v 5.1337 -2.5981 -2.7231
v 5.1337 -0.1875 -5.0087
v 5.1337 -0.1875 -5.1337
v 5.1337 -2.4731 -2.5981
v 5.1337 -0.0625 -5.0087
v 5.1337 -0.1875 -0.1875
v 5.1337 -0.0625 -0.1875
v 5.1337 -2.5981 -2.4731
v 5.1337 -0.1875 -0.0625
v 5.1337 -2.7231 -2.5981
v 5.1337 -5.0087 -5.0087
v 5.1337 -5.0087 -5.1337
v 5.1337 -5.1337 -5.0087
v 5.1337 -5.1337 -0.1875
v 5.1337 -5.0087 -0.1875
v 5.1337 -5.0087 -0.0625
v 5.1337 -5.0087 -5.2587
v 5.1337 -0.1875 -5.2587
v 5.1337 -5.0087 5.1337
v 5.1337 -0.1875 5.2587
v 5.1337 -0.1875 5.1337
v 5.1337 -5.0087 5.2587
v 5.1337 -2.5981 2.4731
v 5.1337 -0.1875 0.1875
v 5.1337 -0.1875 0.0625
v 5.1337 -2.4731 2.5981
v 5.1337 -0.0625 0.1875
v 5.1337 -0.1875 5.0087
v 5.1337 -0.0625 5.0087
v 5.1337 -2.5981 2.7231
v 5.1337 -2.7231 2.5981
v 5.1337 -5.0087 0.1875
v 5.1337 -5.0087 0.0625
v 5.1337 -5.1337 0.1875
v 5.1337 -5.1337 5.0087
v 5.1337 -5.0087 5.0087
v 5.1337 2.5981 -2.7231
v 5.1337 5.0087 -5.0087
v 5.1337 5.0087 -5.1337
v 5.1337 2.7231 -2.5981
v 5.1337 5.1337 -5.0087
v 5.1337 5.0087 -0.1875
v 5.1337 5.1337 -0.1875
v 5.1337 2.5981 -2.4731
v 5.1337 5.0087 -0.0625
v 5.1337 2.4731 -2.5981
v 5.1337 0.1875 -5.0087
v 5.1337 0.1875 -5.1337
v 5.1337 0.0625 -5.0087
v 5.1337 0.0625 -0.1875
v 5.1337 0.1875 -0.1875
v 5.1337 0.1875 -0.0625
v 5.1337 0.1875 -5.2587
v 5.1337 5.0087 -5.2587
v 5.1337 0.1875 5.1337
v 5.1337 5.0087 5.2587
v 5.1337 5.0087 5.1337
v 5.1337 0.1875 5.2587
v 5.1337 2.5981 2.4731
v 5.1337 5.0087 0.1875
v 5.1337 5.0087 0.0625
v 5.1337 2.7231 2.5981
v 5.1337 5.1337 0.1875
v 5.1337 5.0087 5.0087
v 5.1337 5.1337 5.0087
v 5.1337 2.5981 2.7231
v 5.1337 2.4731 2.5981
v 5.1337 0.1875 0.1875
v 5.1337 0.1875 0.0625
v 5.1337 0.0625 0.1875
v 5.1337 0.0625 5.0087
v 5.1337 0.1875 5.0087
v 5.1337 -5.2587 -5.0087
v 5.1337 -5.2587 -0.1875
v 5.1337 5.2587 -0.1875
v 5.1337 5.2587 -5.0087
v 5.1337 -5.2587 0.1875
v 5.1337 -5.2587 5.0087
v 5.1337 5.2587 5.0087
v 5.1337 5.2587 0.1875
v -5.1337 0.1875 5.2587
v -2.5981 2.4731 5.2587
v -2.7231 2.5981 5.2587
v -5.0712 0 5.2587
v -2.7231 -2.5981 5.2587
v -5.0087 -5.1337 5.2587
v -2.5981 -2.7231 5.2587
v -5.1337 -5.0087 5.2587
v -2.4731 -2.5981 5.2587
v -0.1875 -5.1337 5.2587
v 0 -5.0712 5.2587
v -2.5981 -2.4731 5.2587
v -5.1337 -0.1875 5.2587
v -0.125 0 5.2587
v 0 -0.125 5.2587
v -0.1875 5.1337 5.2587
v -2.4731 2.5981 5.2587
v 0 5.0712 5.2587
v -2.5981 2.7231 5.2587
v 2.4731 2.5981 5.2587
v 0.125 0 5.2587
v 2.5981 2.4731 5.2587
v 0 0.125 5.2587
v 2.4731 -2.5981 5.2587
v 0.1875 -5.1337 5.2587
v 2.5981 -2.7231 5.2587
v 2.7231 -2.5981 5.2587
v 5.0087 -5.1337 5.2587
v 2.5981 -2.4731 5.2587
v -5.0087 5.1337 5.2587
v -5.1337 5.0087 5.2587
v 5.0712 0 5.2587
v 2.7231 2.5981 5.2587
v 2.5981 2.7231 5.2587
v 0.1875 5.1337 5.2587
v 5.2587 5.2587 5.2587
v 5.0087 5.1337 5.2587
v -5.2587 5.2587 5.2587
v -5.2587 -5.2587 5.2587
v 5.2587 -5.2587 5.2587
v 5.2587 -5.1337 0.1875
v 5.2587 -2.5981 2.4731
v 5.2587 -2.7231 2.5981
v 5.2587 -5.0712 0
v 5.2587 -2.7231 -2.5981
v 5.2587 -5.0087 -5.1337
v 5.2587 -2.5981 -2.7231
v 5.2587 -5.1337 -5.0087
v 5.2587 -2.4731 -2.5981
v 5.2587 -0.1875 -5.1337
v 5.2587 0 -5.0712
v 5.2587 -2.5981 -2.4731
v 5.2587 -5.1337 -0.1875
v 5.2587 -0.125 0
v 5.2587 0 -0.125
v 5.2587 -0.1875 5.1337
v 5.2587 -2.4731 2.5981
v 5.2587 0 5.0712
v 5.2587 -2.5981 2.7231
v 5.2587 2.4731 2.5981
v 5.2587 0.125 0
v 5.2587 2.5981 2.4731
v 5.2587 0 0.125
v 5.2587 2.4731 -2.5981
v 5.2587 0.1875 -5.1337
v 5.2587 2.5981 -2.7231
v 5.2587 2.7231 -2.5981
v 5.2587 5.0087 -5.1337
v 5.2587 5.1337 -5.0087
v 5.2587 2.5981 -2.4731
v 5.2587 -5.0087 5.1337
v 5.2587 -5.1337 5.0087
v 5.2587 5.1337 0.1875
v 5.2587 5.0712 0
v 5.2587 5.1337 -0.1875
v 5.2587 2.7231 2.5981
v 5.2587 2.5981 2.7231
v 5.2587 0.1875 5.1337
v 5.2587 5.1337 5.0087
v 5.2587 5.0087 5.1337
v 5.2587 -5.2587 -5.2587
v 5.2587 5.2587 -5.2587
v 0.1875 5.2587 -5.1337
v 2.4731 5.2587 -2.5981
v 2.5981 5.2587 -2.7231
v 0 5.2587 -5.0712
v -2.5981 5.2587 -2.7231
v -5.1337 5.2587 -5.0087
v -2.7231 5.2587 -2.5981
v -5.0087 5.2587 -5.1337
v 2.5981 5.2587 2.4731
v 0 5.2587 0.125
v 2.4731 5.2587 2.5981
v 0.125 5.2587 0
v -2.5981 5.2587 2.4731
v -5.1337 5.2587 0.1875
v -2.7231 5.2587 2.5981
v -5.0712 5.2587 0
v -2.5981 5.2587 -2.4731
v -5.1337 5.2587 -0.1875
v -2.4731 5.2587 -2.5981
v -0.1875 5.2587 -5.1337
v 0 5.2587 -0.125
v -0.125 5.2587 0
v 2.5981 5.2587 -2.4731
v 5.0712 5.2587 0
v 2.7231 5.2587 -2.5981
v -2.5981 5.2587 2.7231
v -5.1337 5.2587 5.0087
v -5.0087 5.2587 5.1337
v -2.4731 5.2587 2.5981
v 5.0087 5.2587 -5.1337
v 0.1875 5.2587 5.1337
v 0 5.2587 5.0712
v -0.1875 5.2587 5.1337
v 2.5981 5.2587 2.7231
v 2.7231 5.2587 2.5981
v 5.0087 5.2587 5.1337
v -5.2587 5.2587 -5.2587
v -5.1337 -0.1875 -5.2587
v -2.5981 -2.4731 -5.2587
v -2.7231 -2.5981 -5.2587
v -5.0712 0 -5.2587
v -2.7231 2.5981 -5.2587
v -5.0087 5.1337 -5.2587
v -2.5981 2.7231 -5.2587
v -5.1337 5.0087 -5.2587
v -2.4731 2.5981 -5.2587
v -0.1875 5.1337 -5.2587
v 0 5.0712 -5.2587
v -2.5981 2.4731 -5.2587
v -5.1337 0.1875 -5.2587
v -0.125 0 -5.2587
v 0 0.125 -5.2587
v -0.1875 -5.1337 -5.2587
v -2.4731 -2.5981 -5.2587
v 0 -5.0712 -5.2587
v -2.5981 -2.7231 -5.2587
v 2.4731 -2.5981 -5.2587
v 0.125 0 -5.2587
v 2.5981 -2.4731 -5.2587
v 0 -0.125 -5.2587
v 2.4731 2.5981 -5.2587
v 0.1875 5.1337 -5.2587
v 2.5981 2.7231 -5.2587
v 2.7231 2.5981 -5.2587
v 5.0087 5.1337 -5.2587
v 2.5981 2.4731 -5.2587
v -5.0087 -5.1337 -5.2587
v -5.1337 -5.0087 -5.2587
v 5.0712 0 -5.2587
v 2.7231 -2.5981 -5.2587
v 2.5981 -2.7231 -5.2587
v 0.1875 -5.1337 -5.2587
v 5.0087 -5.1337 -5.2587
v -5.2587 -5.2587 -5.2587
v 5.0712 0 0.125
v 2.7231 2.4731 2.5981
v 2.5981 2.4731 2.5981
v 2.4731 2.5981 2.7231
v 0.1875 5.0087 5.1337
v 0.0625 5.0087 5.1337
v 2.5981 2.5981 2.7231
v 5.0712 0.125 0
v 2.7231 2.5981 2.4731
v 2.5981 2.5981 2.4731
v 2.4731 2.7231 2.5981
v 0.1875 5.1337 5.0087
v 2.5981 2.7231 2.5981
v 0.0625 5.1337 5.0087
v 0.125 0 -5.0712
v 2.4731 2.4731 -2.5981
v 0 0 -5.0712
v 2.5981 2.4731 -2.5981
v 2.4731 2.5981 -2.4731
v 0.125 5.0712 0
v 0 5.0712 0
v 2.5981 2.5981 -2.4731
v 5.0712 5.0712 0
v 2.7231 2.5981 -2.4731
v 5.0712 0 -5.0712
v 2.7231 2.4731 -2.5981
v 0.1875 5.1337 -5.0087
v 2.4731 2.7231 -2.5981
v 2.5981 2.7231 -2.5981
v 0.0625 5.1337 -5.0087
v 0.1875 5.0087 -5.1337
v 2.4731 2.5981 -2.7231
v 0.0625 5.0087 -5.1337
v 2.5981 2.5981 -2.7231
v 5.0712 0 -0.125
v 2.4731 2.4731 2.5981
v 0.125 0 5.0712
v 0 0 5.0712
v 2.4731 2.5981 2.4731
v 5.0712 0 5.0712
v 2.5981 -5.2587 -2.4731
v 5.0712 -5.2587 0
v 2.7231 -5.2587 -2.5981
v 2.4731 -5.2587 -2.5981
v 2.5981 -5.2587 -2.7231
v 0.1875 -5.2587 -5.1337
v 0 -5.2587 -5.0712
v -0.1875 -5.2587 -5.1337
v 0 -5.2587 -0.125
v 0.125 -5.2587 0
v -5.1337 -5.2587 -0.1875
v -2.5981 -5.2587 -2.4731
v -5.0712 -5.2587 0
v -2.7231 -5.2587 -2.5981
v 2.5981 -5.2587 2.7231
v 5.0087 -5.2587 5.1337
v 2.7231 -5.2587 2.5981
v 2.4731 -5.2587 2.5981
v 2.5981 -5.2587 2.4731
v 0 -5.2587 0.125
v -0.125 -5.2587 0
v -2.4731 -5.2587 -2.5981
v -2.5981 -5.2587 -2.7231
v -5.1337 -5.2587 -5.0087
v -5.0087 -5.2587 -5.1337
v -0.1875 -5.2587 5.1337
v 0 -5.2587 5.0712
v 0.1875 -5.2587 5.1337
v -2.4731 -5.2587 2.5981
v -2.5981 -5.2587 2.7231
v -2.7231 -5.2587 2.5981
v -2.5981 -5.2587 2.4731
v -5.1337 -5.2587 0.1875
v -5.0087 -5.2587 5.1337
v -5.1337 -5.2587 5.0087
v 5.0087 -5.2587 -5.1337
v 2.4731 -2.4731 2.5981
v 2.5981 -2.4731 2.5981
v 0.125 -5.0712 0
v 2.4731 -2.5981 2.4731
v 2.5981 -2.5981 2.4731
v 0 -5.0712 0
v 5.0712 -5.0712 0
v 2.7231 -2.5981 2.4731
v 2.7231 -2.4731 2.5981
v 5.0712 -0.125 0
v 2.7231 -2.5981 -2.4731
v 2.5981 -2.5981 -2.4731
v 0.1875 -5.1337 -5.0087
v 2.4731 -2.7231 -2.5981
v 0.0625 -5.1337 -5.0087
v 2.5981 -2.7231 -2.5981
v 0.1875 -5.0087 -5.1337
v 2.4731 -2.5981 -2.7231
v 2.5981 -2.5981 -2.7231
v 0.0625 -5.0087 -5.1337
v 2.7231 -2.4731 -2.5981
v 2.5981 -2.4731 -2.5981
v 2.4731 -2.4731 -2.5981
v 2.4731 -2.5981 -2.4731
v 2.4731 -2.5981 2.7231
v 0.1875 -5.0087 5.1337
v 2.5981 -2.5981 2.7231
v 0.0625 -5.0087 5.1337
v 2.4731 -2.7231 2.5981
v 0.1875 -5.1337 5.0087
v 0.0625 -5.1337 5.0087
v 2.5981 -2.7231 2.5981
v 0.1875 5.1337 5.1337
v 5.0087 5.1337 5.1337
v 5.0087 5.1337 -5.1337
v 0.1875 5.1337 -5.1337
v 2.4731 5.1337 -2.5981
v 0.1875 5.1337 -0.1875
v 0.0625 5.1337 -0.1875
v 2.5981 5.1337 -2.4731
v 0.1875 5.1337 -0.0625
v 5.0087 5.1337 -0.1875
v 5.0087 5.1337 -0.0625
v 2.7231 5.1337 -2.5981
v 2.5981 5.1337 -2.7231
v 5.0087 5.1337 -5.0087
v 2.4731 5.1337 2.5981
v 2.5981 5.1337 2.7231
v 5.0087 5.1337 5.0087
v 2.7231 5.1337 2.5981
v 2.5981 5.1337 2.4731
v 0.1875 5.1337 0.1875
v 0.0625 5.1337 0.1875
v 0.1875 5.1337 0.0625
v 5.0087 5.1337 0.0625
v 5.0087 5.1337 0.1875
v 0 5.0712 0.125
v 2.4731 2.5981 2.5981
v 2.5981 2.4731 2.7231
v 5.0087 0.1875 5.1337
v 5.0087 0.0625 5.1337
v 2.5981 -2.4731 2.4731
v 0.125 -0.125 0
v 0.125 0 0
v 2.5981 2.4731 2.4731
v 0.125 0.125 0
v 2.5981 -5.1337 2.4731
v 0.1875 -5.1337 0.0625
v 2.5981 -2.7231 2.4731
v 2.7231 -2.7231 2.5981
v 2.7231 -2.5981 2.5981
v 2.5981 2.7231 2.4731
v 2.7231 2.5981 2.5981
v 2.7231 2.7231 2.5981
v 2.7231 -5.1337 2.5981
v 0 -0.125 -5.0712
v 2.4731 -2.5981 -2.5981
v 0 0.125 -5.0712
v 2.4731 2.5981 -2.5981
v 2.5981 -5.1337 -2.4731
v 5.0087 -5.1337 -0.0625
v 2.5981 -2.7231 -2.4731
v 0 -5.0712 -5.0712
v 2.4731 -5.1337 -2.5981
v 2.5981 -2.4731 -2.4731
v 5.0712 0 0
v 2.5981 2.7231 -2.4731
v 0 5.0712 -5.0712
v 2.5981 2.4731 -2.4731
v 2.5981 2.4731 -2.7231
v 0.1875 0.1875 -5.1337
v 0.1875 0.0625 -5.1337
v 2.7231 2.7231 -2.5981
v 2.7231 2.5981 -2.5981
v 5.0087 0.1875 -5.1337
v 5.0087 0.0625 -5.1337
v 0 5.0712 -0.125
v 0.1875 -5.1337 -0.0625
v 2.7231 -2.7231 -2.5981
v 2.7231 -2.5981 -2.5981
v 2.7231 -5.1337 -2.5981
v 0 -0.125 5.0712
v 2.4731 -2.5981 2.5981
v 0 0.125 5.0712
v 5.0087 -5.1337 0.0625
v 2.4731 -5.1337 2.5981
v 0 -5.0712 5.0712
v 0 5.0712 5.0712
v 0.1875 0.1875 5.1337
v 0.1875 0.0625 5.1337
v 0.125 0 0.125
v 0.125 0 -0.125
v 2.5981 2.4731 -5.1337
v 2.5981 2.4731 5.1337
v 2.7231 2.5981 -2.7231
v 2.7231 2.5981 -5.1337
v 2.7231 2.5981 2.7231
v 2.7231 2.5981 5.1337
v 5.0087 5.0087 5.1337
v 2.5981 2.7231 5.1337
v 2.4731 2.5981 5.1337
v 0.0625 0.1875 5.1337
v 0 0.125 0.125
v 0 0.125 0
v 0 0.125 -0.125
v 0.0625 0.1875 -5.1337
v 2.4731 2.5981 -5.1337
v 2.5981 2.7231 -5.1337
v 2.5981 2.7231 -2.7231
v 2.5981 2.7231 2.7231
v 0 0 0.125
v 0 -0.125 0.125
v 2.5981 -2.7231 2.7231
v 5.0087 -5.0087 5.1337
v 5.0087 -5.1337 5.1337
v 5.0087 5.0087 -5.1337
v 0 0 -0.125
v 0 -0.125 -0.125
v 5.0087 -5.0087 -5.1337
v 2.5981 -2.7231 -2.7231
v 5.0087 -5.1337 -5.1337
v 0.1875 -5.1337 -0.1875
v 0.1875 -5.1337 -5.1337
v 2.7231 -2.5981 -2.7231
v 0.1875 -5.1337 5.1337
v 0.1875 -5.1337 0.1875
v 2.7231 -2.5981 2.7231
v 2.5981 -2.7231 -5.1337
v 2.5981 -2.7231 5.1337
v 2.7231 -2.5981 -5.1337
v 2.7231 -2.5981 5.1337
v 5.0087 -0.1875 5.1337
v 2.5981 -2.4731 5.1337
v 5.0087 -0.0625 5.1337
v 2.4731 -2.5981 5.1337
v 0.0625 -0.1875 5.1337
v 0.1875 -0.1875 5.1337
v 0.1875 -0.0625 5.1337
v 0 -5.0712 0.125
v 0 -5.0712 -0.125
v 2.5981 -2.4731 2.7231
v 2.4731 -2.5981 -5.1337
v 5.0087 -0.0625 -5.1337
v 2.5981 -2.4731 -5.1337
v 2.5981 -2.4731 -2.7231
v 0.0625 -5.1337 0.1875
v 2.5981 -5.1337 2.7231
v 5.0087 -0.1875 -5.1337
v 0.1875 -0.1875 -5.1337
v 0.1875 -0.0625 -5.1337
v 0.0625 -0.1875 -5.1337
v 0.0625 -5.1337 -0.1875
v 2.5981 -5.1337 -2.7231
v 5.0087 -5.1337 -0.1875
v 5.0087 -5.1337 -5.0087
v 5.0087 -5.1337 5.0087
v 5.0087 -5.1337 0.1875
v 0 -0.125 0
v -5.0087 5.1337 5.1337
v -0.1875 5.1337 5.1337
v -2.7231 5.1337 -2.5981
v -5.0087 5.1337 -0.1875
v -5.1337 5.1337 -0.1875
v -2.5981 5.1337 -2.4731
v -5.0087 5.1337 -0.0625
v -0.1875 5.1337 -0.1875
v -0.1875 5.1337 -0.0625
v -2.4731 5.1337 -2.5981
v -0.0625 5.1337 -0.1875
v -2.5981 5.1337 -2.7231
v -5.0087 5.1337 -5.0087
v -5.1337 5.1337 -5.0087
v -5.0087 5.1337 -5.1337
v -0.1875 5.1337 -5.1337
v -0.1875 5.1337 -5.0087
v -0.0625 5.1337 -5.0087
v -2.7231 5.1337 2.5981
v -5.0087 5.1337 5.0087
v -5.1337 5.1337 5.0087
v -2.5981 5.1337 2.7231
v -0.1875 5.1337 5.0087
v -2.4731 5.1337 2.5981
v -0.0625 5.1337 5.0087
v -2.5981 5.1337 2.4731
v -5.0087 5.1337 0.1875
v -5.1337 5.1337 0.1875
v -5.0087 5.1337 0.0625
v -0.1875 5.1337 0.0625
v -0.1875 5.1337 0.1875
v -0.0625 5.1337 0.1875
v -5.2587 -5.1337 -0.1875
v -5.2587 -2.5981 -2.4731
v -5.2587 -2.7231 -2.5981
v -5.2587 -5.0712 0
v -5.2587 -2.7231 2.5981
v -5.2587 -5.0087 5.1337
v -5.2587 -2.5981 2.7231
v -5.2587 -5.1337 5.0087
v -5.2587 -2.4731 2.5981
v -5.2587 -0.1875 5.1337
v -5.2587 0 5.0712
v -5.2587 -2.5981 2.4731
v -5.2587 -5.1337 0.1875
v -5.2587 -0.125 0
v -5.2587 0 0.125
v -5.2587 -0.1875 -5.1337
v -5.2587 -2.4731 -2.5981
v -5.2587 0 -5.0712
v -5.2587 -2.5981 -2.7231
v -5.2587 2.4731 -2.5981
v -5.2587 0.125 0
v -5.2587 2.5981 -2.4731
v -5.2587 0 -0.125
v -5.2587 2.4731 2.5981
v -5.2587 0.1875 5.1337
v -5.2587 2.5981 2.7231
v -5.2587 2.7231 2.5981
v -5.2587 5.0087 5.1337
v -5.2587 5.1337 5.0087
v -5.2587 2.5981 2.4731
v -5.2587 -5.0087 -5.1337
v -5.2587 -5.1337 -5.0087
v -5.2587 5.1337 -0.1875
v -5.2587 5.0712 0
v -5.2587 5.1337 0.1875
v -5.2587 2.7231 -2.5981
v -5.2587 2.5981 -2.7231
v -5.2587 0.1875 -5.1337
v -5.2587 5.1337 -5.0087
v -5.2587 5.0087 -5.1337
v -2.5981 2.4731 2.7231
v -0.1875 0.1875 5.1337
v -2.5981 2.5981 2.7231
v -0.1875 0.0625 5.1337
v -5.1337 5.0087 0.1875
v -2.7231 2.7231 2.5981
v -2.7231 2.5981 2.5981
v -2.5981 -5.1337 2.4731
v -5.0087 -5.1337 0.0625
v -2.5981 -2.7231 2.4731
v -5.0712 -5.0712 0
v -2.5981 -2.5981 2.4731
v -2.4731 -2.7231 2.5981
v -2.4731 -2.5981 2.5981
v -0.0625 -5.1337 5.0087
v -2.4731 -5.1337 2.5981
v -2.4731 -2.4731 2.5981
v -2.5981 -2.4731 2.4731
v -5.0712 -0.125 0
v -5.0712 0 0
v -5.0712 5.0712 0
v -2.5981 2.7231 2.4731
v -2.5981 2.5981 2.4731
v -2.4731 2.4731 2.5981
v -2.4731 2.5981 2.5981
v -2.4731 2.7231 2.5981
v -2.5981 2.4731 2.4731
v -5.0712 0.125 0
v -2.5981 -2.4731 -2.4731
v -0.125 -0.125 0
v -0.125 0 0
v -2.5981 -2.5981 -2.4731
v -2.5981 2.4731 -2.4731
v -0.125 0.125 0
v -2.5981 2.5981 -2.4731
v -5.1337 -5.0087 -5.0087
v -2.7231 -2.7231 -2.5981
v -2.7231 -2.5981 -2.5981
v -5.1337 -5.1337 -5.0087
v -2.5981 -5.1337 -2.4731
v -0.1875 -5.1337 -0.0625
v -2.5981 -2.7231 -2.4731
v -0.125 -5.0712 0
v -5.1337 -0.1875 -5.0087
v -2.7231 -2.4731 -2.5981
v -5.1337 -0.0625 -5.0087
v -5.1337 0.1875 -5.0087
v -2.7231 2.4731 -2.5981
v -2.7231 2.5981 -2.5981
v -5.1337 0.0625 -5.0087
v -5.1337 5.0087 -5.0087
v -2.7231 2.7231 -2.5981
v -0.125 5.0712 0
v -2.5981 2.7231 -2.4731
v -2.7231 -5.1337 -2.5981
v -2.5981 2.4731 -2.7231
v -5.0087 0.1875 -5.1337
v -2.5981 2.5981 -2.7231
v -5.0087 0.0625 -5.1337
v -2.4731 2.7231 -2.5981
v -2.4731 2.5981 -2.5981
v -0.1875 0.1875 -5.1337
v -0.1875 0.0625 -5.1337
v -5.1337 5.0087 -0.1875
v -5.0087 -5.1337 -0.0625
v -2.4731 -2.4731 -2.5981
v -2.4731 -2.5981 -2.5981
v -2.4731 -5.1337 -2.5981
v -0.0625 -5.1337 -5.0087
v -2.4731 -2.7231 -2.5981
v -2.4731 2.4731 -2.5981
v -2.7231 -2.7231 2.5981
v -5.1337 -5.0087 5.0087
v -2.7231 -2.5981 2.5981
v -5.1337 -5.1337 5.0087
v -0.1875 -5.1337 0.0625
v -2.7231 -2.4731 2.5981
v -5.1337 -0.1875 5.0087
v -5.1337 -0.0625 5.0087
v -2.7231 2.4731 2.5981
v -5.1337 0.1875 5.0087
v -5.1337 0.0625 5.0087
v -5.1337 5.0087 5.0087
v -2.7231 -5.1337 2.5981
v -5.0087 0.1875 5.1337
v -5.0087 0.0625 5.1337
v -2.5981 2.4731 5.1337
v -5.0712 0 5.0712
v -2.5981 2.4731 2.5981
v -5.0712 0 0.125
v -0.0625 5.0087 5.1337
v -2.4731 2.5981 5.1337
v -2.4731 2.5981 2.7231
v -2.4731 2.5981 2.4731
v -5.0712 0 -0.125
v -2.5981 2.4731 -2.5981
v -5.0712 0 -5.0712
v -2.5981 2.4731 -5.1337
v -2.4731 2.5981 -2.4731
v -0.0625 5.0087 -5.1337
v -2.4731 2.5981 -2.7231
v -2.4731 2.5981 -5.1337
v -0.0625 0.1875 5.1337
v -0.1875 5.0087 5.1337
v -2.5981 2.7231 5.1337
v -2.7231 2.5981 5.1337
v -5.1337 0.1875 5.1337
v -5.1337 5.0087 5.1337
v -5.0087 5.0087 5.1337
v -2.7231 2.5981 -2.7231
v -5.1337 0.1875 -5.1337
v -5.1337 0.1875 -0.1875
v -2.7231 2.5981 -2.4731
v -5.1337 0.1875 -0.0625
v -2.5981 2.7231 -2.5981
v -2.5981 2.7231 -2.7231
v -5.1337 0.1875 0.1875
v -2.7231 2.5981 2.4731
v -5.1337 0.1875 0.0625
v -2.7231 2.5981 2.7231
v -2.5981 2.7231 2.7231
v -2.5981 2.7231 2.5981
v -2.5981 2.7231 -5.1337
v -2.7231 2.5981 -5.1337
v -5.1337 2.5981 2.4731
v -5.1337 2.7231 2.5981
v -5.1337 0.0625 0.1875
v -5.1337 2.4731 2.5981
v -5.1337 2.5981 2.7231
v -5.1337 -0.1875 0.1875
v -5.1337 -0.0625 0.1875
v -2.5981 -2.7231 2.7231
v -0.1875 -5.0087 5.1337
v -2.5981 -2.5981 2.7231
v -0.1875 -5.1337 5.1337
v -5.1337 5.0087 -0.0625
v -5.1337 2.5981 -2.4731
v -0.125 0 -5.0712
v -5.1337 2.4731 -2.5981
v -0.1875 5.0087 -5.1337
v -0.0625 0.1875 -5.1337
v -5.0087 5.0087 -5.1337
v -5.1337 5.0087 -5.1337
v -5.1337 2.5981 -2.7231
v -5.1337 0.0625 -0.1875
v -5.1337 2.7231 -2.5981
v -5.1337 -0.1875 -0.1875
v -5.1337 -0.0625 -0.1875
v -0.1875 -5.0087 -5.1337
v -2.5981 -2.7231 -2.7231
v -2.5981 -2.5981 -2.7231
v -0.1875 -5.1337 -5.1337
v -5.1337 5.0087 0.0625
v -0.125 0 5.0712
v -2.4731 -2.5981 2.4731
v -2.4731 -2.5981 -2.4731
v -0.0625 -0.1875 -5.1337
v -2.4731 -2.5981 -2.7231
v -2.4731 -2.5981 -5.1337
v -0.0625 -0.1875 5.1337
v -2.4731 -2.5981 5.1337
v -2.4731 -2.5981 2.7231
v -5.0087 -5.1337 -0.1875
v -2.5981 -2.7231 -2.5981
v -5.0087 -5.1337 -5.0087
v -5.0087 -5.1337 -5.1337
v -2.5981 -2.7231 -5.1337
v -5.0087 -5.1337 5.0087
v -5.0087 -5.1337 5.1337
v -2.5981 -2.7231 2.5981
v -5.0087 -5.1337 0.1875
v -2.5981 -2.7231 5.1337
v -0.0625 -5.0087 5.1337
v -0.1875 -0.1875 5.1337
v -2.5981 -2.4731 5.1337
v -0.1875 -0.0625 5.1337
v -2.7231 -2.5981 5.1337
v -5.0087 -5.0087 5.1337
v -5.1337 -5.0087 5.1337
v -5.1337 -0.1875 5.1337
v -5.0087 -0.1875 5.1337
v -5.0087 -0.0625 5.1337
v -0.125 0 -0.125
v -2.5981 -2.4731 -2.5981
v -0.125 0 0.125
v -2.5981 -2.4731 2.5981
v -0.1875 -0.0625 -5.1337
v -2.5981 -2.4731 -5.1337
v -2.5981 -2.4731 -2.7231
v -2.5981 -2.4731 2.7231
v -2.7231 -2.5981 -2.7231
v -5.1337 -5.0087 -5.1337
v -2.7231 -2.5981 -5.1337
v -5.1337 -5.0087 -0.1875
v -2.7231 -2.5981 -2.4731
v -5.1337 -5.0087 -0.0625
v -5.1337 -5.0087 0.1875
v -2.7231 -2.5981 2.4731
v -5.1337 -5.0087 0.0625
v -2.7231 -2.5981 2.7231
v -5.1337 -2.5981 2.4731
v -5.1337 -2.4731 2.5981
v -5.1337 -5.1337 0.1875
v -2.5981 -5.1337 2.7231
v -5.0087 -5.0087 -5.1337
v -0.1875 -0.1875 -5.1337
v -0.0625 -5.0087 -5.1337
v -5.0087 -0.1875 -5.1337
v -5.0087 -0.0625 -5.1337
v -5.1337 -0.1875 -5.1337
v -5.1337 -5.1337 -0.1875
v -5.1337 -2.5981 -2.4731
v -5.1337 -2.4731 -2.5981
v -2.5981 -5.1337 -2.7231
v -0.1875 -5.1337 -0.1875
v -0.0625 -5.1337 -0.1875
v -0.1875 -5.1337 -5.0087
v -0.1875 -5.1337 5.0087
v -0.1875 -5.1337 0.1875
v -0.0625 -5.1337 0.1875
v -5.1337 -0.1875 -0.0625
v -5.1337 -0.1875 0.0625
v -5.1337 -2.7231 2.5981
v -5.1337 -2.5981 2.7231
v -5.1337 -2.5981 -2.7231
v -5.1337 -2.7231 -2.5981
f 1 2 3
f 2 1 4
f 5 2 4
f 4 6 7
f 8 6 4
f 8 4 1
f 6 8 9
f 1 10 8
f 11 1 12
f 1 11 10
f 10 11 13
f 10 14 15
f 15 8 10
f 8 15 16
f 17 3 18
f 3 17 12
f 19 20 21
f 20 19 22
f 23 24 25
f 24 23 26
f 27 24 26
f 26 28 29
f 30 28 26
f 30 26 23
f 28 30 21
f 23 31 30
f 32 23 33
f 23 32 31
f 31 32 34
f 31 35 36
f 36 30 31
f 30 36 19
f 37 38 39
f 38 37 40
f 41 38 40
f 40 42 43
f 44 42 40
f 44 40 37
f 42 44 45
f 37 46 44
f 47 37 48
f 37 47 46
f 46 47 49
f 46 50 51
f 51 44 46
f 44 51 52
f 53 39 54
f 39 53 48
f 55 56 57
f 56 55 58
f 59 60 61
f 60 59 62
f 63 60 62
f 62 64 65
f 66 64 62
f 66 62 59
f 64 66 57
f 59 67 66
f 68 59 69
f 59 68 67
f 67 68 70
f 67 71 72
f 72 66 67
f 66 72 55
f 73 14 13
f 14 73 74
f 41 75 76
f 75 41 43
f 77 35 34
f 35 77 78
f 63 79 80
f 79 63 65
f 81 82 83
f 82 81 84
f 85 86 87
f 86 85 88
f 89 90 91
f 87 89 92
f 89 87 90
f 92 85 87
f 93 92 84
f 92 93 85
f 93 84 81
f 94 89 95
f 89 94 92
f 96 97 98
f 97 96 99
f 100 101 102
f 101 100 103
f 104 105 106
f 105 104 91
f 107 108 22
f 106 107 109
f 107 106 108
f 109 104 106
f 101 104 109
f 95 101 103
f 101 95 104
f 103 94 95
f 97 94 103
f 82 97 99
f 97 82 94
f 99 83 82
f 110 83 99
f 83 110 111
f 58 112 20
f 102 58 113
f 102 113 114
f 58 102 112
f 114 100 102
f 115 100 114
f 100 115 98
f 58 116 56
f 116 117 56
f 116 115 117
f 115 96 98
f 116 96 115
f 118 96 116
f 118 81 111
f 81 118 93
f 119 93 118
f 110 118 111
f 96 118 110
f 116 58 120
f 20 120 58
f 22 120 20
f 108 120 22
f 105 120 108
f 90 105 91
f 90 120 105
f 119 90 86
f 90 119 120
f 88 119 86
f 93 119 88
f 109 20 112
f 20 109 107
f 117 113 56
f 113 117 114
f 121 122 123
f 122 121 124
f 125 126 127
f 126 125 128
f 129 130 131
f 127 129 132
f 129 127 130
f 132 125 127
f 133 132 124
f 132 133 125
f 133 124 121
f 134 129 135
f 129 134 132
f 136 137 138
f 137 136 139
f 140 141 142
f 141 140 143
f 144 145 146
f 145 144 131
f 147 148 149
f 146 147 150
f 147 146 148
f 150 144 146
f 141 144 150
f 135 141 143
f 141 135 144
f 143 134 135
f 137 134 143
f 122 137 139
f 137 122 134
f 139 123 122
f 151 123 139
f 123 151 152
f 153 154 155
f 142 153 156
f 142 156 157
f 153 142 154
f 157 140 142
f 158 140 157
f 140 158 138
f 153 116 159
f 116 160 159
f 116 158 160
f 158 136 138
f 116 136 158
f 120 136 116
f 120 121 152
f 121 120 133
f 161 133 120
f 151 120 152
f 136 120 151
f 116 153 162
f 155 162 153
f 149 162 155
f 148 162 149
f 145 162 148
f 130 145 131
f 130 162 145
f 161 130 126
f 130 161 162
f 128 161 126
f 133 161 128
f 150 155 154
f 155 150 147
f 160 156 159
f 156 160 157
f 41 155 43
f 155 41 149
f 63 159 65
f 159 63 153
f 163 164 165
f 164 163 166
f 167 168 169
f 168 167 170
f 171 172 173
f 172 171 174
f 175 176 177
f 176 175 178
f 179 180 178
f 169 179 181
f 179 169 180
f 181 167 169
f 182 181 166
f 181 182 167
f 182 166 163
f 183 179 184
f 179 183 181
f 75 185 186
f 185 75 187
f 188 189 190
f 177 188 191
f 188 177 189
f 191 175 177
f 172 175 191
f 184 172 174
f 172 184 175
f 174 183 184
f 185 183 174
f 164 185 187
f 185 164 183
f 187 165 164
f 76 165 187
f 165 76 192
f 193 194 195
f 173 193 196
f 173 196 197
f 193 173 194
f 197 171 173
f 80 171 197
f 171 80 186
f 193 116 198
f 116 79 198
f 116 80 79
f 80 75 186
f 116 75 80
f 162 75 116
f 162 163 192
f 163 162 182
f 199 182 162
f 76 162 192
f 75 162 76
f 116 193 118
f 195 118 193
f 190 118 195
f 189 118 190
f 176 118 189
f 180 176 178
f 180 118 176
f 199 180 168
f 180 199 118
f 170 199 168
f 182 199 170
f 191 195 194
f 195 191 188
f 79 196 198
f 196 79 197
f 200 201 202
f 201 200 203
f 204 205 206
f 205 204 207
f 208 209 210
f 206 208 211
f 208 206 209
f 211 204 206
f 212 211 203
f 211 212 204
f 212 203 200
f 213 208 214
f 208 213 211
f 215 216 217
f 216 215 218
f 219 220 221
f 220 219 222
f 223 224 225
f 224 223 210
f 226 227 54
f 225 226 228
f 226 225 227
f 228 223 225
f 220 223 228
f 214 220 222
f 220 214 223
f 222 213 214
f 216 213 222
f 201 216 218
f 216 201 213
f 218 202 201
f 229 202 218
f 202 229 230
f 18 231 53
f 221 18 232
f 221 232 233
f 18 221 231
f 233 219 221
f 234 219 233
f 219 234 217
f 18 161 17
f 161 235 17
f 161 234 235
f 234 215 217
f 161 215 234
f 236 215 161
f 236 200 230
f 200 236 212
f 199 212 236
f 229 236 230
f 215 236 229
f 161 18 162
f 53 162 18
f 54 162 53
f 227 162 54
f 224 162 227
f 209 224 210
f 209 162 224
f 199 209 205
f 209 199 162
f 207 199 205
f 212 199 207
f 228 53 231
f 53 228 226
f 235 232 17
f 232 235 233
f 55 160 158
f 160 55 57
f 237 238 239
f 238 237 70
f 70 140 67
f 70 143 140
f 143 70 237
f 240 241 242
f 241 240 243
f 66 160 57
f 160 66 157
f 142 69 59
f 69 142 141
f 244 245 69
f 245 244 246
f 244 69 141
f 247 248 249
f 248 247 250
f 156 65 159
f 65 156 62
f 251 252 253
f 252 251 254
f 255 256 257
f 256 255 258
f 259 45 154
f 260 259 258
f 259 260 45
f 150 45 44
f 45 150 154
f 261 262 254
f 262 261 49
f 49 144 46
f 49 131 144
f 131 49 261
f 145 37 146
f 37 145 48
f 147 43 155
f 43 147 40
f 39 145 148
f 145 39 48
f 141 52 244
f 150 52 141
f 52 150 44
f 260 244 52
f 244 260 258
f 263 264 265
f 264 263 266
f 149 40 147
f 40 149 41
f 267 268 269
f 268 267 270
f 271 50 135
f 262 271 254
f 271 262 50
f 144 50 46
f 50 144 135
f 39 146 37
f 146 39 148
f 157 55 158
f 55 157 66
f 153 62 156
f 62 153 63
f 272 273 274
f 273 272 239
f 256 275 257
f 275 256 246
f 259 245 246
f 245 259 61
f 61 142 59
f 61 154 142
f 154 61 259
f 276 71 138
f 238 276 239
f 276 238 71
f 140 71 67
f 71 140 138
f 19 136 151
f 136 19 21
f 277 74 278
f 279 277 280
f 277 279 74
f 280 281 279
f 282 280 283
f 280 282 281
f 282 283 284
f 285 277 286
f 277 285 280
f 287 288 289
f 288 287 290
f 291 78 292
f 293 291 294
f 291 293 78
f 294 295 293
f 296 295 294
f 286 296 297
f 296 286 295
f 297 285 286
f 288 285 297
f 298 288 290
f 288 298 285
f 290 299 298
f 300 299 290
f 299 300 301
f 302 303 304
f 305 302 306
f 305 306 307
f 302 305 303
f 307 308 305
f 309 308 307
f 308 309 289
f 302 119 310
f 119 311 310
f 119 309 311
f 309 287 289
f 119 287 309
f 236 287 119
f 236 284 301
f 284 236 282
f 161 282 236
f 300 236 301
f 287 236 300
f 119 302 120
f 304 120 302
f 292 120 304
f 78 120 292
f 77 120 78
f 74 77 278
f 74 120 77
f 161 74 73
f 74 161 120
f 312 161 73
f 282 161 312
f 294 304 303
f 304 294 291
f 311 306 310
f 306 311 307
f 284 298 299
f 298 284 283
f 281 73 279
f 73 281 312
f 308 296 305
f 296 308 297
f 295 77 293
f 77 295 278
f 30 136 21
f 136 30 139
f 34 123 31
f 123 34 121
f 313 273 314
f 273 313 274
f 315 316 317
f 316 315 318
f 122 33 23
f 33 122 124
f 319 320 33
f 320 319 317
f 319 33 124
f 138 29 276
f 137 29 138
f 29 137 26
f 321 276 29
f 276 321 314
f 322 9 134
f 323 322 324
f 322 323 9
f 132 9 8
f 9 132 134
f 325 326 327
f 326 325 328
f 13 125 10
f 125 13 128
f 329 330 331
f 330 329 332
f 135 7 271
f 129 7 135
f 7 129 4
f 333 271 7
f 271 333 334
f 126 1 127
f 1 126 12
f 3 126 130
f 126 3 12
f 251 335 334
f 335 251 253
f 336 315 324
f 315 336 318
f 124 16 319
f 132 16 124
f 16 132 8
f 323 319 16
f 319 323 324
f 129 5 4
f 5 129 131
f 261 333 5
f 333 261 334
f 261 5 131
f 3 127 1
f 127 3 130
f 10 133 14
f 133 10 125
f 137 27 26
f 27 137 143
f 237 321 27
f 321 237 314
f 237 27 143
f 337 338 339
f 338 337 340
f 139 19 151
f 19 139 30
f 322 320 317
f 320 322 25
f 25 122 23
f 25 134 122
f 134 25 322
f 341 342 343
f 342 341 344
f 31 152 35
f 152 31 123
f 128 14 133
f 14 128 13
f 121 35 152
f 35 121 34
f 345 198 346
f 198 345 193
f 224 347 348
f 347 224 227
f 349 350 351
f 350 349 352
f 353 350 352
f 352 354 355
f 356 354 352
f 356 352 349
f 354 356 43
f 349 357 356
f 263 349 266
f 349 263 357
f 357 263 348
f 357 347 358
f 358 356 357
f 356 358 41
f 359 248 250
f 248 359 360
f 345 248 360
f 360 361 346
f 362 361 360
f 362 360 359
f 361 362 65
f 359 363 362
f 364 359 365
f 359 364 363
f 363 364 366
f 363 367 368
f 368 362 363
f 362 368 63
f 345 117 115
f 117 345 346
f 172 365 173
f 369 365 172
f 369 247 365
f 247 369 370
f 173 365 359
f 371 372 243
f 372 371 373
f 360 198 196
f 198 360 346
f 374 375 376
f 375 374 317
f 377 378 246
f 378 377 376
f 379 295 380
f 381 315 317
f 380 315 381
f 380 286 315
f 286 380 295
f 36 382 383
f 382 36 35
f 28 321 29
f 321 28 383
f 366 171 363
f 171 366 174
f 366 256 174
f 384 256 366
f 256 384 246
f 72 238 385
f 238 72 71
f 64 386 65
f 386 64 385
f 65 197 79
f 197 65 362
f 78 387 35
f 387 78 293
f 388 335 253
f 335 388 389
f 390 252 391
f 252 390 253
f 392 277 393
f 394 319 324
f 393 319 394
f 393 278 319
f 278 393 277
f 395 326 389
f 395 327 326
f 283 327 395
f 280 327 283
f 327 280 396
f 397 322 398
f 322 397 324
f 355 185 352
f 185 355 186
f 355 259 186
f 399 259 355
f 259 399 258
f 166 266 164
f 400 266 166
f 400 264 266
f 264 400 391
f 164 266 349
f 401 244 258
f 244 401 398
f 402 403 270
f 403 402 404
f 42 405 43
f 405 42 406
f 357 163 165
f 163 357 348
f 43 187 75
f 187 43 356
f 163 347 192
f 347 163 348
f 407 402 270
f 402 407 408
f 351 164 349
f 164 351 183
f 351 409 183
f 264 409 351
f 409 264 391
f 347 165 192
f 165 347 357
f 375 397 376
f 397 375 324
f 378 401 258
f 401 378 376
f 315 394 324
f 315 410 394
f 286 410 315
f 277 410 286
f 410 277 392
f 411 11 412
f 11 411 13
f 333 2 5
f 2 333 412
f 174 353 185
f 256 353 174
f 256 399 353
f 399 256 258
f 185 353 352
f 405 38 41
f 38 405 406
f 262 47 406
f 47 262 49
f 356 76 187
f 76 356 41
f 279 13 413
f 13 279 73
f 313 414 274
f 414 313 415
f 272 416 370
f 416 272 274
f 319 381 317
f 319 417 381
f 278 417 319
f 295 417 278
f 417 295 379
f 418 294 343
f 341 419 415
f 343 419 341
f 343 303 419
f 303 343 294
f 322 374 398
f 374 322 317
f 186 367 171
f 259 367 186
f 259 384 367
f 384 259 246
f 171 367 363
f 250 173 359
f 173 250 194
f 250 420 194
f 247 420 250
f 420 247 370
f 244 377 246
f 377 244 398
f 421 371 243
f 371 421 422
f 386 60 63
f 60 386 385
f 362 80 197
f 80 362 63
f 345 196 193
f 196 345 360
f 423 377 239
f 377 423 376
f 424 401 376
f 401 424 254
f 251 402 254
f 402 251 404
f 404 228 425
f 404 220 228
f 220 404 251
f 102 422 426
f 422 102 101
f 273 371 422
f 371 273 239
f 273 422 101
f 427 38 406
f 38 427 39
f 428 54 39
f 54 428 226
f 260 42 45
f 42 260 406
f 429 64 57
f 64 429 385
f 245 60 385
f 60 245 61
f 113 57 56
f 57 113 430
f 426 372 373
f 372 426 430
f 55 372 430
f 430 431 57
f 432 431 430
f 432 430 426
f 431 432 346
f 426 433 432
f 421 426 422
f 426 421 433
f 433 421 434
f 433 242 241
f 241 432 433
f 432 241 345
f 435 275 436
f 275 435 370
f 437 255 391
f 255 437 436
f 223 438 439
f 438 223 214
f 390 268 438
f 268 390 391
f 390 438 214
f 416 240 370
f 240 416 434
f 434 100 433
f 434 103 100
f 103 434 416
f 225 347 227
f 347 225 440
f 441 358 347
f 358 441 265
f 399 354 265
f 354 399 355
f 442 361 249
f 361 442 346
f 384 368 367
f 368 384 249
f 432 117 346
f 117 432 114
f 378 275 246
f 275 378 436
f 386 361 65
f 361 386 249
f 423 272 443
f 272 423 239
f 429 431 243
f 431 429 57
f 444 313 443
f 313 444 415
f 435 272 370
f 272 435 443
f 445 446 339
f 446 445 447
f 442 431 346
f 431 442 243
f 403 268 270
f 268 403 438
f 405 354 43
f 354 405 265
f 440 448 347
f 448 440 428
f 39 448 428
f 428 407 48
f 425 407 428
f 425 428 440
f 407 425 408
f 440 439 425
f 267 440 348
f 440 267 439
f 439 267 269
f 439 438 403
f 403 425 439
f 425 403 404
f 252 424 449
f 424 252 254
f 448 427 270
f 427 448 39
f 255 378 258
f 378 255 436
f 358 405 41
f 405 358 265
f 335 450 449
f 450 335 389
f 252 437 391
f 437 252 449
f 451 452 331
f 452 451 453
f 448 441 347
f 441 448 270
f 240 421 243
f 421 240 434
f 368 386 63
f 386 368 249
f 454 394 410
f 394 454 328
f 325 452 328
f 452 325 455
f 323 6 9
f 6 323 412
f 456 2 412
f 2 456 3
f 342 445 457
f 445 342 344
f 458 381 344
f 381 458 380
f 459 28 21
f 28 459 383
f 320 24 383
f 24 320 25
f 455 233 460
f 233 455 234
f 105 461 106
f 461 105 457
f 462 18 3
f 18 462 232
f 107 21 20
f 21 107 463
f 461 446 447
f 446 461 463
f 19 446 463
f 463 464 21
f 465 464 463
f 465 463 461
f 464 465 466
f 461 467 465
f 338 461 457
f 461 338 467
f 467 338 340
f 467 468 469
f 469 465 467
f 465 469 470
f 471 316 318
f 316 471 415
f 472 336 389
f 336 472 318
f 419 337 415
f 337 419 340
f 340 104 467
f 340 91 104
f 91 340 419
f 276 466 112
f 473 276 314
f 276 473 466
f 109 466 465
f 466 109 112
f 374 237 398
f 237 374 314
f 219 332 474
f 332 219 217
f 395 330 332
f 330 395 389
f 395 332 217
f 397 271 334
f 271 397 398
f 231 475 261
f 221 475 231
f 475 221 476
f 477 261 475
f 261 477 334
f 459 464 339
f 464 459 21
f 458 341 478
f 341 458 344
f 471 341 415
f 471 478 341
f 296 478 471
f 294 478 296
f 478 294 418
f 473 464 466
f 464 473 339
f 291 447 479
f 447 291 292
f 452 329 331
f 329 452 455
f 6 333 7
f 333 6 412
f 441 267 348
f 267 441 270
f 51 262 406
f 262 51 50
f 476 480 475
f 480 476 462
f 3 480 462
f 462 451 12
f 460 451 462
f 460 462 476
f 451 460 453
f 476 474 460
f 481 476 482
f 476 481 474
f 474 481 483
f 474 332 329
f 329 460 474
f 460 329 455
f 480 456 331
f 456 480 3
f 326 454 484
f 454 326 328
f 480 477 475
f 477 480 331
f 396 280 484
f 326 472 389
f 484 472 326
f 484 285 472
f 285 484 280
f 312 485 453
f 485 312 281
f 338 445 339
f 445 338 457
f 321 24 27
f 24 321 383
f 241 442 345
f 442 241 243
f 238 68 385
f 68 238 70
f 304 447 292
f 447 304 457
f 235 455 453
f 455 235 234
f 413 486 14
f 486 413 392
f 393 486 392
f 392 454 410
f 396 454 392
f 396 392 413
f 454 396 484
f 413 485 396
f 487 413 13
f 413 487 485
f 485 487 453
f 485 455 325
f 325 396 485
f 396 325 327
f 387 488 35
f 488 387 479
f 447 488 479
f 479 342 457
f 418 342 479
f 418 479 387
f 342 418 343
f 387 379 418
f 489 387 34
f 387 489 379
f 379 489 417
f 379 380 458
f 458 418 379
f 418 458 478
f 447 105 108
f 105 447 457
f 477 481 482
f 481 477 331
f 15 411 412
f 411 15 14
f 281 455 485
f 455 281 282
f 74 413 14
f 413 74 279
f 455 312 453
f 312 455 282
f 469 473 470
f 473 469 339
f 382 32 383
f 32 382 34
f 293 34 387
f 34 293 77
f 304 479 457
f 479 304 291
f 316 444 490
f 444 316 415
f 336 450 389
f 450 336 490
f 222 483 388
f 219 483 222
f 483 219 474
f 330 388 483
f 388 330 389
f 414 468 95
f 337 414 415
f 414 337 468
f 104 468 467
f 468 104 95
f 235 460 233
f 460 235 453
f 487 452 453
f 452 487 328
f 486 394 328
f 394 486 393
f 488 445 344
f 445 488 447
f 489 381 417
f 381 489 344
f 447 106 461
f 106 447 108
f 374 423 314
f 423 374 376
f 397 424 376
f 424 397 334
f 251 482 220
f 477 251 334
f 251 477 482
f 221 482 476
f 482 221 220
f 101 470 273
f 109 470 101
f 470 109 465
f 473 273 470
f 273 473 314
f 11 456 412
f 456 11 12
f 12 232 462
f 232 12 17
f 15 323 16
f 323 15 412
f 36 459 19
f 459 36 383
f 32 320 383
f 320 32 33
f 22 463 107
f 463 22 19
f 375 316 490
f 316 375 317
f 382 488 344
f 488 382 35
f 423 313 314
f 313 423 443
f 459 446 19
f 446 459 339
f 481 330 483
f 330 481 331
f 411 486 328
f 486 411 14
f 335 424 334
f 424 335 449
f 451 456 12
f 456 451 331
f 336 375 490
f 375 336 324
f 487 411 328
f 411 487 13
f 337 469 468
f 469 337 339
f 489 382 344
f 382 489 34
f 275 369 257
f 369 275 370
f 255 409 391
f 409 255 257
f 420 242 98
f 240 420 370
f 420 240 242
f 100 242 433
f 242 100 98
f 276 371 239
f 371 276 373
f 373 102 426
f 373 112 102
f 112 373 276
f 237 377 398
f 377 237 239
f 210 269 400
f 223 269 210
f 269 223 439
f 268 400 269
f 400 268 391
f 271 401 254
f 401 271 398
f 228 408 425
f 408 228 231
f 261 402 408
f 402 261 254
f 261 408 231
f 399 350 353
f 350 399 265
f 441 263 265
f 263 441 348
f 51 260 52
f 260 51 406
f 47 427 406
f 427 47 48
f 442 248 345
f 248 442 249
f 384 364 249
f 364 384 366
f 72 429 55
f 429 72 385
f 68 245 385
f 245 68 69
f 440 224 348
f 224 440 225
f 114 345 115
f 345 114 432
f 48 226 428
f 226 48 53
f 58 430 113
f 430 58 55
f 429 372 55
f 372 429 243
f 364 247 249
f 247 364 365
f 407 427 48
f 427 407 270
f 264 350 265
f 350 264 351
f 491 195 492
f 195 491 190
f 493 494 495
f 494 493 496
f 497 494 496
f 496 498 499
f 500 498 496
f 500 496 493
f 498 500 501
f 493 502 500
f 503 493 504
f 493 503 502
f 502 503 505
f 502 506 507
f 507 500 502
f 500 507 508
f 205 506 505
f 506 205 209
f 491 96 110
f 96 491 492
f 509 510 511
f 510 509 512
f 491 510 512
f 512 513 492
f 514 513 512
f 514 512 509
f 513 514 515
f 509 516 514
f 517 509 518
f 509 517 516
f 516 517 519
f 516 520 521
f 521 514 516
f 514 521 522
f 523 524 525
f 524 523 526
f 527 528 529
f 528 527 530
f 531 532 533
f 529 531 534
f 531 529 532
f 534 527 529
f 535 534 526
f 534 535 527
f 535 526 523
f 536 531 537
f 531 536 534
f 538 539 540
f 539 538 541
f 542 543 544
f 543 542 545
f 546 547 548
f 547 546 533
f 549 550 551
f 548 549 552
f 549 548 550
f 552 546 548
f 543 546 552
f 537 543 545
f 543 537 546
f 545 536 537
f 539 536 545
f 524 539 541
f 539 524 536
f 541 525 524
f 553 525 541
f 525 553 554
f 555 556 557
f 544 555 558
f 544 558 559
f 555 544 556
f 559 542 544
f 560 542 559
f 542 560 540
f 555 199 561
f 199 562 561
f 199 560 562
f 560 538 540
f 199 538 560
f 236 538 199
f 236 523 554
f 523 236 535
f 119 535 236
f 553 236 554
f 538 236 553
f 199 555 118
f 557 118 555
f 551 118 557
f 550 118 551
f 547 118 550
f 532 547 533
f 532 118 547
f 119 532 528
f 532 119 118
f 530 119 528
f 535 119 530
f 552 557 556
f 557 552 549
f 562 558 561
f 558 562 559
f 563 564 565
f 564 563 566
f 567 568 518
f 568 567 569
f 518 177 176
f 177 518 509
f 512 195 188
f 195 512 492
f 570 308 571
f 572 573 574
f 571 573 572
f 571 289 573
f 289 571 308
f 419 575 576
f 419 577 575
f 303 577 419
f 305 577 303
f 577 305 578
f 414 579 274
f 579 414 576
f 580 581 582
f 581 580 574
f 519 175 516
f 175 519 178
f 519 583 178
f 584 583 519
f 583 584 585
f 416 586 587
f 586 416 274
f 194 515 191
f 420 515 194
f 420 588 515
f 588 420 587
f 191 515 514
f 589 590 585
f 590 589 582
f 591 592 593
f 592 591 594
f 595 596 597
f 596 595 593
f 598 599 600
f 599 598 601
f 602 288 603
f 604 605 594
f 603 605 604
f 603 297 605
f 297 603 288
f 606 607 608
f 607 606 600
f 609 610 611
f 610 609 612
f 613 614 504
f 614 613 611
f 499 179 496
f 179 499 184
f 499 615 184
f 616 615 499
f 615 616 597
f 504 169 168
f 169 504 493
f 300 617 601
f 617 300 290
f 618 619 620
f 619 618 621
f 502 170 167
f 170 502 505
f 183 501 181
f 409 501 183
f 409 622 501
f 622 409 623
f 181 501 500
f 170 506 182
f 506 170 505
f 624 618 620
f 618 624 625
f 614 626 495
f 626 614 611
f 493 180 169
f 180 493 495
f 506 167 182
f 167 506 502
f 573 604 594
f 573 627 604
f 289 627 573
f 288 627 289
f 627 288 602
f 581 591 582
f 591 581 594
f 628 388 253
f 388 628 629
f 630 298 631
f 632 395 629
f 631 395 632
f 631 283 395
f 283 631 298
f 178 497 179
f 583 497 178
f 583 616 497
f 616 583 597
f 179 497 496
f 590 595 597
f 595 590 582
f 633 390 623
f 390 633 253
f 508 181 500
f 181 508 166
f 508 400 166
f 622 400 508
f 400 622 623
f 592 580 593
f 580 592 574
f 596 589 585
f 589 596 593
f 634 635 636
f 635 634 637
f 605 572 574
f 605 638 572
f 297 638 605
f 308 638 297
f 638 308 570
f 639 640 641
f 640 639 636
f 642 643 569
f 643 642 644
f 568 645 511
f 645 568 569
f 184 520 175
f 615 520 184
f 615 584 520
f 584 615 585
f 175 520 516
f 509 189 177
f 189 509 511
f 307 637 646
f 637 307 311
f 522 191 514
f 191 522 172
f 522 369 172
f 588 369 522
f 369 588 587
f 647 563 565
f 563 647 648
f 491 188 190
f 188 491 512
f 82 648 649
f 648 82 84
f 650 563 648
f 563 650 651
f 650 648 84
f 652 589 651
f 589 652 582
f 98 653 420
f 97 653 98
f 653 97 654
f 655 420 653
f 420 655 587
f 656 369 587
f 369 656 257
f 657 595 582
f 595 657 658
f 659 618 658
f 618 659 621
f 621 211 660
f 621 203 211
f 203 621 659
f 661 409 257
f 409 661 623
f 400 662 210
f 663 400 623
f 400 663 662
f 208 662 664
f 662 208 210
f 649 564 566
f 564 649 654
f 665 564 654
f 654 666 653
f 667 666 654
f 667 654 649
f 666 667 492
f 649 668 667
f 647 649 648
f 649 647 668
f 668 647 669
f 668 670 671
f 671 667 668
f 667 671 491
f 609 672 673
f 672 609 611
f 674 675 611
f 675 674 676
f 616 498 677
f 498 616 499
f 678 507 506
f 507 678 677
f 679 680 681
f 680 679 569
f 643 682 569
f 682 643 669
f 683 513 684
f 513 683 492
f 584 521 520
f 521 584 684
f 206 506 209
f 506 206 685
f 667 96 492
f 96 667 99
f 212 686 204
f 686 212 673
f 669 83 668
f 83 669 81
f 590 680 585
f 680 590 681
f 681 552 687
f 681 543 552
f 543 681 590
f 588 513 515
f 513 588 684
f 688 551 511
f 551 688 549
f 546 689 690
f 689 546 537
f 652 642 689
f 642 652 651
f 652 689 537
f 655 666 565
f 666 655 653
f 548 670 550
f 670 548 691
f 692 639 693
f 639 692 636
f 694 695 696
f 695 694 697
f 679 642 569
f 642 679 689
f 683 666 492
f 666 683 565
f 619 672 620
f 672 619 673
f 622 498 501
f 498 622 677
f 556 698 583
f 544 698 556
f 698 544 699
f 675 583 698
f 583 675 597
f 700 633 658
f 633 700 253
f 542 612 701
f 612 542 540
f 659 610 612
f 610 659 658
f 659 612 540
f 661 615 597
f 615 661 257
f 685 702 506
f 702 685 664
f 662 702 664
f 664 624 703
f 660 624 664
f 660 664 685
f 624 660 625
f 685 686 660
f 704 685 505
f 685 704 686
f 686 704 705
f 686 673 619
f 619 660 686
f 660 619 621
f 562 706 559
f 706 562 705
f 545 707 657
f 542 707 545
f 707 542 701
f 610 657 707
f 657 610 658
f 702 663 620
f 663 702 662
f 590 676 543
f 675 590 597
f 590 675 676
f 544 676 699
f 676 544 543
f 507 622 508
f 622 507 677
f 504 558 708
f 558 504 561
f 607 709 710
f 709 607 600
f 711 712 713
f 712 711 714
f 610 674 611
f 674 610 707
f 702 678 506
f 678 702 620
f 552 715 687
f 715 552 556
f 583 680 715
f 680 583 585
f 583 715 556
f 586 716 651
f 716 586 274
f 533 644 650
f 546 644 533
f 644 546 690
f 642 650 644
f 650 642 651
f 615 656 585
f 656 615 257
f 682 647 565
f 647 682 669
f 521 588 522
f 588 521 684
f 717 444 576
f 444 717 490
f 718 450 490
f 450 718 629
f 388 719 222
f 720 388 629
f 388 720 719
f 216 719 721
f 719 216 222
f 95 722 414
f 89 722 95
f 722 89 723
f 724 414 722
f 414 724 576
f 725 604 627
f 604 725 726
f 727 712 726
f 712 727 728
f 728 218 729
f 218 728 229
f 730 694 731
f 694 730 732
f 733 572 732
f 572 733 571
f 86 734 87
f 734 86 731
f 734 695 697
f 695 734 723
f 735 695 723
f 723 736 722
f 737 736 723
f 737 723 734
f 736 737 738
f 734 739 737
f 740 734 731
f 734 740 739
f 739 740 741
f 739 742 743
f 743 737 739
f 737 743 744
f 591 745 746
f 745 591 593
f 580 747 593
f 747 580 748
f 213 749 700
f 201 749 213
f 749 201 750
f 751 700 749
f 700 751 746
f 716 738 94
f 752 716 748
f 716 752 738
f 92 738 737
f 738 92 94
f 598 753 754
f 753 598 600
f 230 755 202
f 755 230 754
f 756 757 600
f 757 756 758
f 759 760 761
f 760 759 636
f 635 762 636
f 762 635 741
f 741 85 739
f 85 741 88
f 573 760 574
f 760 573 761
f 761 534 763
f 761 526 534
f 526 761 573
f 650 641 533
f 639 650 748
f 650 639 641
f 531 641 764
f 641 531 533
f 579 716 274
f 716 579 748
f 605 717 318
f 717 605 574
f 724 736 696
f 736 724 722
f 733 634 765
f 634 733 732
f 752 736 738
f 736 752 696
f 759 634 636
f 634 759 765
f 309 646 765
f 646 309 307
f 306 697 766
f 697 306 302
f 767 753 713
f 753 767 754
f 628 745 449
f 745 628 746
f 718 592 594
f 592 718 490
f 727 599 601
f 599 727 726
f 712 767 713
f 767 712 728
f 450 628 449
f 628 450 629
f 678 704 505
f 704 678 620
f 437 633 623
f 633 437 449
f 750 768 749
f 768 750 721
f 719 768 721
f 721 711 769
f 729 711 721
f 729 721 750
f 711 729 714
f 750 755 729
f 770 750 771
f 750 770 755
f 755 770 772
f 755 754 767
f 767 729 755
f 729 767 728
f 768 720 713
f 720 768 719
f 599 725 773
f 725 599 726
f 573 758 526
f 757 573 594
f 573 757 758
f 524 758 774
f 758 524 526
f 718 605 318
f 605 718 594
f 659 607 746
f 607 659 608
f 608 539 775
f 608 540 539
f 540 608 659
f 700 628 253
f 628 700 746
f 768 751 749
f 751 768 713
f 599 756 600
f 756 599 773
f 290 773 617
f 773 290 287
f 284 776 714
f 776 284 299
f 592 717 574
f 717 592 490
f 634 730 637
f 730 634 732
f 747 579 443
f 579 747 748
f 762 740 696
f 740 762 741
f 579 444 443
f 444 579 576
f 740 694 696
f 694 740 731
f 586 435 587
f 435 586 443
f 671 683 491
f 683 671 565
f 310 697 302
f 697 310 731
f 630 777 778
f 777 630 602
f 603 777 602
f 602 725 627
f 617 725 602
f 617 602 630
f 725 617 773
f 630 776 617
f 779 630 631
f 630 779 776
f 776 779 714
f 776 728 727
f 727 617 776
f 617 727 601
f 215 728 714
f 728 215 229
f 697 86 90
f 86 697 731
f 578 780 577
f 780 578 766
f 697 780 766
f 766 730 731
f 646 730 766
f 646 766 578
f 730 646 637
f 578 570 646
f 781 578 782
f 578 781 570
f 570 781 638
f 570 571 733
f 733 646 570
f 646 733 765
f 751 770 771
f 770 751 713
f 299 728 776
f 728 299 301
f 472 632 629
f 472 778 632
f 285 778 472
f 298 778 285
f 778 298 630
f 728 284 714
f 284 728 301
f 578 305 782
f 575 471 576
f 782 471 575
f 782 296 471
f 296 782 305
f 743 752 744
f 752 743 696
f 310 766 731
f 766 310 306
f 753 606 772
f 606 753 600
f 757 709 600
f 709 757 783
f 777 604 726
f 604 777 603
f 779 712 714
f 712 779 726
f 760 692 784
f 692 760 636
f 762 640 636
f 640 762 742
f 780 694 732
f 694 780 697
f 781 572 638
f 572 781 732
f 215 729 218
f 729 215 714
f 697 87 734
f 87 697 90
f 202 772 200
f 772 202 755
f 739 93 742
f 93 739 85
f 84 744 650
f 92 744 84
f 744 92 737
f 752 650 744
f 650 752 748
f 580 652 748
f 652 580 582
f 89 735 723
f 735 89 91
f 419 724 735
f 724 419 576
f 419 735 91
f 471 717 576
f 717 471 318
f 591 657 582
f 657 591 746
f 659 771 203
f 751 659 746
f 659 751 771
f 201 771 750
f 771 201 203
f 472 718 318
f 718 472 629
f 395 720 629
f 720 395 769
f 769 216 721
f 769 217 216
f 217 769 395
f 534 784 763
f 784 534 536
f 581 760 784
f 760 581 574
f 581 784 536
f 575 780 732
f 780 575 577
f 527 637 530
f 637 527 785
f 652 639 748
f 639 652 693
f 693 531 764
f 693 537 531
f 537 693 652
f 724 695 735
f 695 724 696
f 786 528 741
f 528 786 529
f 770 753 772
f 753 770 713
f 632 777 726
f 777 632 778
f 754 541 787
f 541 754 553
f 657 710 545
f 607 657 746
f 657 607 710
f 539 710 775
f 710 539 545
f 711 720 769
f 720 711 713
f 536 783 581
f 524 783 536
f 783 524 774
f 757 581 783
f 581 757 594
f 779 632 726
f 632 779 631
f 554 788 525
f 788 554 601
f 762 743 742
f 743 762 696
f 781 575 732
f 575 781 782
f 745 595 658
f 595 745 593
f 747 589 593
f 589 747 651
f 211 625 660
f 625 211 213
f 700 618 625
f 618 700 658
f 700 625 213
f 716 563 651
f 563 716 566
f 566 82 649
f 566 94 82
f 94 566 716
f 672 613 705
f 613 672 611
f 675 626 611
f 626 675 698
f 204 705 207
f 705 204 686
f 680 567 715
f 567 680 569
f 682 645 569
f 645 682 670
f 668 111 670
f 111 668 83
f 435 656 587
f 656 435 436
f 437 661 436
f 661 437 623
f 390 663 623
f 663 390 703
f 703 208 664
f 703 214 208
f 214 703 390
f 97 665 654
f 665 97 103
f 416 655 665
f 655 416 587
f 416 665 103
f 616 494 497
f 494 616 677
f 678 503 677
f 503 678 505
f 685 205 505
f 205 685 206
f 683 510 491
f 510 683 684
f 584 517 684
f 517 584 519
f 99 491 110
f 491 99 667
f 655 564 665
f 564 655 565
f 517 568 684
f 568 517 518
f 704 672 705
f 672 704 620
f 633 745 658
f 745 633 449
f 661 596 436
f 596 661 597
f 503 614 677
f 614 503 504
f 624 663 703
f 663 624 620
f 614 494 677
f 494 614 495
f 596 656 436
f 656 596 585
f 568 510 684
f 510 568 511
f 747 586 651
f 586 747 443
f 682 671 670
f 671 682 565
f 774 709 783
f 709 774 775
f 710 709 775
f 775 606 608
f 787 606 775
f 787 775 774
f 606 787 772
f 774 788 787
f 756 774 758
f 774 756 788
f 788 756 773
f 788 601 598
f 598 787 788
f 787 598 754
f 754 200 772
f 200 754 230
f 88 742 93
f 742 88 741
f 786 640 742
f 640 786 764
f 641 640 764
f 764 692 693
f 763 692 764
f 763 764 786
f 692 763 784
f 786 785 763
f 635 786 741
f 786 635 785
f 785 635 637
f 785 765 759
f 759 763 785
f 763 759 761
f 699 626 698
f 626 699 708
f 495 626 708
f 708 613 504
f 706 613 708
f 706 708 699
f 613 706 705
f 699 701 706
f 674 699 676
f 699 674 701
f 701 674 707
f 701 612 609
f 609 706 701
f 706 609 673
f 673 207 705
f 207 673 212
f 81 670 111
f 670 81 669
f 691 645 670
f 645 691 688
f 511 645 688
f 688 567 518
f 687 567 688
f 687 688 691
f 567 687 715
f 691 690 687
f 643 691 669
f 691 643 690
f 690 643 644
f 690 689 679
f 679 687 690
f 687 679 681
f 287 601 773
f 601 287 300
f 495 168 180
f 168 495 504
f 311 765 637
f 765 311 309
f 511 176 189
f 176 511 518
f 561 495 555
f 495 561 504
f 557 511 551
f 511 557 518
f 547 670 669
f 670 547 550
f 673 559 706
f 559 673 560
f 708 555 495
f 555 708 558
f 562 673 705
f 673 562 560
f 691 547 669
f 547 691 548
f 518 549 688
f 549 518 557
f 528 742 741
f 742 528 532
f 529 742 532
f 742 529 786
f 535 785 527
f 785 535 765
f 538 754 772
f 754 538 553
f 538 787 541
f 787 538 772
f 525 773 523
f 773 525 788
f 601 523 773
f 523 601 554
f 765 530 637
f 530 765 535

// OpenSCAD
nbr=6;
taille=0.125;
union()
{
for (i=[1:nbr])
{
        union()
        {

    for (j=[1:nbr])
    {
        union()
        {
        for (k=[1:nbr])
        {
            hull()
            {
            translate([sin(360/nbr*i)*nbr,sin(360/nbr*j)*nbr,sin(360/nbr*k)*nbr])
            cube([taille,taille,taille],center=true);
            
            translate([sin(360/nbr*(i+1))*nbr,sin(360/nbr*(j+1))*nbr,sin(360/nbr*(k+1))*nbr])
            cube([taille,taille,taille],center=true);
            }
        }
    }   
    }    
}
}
}
